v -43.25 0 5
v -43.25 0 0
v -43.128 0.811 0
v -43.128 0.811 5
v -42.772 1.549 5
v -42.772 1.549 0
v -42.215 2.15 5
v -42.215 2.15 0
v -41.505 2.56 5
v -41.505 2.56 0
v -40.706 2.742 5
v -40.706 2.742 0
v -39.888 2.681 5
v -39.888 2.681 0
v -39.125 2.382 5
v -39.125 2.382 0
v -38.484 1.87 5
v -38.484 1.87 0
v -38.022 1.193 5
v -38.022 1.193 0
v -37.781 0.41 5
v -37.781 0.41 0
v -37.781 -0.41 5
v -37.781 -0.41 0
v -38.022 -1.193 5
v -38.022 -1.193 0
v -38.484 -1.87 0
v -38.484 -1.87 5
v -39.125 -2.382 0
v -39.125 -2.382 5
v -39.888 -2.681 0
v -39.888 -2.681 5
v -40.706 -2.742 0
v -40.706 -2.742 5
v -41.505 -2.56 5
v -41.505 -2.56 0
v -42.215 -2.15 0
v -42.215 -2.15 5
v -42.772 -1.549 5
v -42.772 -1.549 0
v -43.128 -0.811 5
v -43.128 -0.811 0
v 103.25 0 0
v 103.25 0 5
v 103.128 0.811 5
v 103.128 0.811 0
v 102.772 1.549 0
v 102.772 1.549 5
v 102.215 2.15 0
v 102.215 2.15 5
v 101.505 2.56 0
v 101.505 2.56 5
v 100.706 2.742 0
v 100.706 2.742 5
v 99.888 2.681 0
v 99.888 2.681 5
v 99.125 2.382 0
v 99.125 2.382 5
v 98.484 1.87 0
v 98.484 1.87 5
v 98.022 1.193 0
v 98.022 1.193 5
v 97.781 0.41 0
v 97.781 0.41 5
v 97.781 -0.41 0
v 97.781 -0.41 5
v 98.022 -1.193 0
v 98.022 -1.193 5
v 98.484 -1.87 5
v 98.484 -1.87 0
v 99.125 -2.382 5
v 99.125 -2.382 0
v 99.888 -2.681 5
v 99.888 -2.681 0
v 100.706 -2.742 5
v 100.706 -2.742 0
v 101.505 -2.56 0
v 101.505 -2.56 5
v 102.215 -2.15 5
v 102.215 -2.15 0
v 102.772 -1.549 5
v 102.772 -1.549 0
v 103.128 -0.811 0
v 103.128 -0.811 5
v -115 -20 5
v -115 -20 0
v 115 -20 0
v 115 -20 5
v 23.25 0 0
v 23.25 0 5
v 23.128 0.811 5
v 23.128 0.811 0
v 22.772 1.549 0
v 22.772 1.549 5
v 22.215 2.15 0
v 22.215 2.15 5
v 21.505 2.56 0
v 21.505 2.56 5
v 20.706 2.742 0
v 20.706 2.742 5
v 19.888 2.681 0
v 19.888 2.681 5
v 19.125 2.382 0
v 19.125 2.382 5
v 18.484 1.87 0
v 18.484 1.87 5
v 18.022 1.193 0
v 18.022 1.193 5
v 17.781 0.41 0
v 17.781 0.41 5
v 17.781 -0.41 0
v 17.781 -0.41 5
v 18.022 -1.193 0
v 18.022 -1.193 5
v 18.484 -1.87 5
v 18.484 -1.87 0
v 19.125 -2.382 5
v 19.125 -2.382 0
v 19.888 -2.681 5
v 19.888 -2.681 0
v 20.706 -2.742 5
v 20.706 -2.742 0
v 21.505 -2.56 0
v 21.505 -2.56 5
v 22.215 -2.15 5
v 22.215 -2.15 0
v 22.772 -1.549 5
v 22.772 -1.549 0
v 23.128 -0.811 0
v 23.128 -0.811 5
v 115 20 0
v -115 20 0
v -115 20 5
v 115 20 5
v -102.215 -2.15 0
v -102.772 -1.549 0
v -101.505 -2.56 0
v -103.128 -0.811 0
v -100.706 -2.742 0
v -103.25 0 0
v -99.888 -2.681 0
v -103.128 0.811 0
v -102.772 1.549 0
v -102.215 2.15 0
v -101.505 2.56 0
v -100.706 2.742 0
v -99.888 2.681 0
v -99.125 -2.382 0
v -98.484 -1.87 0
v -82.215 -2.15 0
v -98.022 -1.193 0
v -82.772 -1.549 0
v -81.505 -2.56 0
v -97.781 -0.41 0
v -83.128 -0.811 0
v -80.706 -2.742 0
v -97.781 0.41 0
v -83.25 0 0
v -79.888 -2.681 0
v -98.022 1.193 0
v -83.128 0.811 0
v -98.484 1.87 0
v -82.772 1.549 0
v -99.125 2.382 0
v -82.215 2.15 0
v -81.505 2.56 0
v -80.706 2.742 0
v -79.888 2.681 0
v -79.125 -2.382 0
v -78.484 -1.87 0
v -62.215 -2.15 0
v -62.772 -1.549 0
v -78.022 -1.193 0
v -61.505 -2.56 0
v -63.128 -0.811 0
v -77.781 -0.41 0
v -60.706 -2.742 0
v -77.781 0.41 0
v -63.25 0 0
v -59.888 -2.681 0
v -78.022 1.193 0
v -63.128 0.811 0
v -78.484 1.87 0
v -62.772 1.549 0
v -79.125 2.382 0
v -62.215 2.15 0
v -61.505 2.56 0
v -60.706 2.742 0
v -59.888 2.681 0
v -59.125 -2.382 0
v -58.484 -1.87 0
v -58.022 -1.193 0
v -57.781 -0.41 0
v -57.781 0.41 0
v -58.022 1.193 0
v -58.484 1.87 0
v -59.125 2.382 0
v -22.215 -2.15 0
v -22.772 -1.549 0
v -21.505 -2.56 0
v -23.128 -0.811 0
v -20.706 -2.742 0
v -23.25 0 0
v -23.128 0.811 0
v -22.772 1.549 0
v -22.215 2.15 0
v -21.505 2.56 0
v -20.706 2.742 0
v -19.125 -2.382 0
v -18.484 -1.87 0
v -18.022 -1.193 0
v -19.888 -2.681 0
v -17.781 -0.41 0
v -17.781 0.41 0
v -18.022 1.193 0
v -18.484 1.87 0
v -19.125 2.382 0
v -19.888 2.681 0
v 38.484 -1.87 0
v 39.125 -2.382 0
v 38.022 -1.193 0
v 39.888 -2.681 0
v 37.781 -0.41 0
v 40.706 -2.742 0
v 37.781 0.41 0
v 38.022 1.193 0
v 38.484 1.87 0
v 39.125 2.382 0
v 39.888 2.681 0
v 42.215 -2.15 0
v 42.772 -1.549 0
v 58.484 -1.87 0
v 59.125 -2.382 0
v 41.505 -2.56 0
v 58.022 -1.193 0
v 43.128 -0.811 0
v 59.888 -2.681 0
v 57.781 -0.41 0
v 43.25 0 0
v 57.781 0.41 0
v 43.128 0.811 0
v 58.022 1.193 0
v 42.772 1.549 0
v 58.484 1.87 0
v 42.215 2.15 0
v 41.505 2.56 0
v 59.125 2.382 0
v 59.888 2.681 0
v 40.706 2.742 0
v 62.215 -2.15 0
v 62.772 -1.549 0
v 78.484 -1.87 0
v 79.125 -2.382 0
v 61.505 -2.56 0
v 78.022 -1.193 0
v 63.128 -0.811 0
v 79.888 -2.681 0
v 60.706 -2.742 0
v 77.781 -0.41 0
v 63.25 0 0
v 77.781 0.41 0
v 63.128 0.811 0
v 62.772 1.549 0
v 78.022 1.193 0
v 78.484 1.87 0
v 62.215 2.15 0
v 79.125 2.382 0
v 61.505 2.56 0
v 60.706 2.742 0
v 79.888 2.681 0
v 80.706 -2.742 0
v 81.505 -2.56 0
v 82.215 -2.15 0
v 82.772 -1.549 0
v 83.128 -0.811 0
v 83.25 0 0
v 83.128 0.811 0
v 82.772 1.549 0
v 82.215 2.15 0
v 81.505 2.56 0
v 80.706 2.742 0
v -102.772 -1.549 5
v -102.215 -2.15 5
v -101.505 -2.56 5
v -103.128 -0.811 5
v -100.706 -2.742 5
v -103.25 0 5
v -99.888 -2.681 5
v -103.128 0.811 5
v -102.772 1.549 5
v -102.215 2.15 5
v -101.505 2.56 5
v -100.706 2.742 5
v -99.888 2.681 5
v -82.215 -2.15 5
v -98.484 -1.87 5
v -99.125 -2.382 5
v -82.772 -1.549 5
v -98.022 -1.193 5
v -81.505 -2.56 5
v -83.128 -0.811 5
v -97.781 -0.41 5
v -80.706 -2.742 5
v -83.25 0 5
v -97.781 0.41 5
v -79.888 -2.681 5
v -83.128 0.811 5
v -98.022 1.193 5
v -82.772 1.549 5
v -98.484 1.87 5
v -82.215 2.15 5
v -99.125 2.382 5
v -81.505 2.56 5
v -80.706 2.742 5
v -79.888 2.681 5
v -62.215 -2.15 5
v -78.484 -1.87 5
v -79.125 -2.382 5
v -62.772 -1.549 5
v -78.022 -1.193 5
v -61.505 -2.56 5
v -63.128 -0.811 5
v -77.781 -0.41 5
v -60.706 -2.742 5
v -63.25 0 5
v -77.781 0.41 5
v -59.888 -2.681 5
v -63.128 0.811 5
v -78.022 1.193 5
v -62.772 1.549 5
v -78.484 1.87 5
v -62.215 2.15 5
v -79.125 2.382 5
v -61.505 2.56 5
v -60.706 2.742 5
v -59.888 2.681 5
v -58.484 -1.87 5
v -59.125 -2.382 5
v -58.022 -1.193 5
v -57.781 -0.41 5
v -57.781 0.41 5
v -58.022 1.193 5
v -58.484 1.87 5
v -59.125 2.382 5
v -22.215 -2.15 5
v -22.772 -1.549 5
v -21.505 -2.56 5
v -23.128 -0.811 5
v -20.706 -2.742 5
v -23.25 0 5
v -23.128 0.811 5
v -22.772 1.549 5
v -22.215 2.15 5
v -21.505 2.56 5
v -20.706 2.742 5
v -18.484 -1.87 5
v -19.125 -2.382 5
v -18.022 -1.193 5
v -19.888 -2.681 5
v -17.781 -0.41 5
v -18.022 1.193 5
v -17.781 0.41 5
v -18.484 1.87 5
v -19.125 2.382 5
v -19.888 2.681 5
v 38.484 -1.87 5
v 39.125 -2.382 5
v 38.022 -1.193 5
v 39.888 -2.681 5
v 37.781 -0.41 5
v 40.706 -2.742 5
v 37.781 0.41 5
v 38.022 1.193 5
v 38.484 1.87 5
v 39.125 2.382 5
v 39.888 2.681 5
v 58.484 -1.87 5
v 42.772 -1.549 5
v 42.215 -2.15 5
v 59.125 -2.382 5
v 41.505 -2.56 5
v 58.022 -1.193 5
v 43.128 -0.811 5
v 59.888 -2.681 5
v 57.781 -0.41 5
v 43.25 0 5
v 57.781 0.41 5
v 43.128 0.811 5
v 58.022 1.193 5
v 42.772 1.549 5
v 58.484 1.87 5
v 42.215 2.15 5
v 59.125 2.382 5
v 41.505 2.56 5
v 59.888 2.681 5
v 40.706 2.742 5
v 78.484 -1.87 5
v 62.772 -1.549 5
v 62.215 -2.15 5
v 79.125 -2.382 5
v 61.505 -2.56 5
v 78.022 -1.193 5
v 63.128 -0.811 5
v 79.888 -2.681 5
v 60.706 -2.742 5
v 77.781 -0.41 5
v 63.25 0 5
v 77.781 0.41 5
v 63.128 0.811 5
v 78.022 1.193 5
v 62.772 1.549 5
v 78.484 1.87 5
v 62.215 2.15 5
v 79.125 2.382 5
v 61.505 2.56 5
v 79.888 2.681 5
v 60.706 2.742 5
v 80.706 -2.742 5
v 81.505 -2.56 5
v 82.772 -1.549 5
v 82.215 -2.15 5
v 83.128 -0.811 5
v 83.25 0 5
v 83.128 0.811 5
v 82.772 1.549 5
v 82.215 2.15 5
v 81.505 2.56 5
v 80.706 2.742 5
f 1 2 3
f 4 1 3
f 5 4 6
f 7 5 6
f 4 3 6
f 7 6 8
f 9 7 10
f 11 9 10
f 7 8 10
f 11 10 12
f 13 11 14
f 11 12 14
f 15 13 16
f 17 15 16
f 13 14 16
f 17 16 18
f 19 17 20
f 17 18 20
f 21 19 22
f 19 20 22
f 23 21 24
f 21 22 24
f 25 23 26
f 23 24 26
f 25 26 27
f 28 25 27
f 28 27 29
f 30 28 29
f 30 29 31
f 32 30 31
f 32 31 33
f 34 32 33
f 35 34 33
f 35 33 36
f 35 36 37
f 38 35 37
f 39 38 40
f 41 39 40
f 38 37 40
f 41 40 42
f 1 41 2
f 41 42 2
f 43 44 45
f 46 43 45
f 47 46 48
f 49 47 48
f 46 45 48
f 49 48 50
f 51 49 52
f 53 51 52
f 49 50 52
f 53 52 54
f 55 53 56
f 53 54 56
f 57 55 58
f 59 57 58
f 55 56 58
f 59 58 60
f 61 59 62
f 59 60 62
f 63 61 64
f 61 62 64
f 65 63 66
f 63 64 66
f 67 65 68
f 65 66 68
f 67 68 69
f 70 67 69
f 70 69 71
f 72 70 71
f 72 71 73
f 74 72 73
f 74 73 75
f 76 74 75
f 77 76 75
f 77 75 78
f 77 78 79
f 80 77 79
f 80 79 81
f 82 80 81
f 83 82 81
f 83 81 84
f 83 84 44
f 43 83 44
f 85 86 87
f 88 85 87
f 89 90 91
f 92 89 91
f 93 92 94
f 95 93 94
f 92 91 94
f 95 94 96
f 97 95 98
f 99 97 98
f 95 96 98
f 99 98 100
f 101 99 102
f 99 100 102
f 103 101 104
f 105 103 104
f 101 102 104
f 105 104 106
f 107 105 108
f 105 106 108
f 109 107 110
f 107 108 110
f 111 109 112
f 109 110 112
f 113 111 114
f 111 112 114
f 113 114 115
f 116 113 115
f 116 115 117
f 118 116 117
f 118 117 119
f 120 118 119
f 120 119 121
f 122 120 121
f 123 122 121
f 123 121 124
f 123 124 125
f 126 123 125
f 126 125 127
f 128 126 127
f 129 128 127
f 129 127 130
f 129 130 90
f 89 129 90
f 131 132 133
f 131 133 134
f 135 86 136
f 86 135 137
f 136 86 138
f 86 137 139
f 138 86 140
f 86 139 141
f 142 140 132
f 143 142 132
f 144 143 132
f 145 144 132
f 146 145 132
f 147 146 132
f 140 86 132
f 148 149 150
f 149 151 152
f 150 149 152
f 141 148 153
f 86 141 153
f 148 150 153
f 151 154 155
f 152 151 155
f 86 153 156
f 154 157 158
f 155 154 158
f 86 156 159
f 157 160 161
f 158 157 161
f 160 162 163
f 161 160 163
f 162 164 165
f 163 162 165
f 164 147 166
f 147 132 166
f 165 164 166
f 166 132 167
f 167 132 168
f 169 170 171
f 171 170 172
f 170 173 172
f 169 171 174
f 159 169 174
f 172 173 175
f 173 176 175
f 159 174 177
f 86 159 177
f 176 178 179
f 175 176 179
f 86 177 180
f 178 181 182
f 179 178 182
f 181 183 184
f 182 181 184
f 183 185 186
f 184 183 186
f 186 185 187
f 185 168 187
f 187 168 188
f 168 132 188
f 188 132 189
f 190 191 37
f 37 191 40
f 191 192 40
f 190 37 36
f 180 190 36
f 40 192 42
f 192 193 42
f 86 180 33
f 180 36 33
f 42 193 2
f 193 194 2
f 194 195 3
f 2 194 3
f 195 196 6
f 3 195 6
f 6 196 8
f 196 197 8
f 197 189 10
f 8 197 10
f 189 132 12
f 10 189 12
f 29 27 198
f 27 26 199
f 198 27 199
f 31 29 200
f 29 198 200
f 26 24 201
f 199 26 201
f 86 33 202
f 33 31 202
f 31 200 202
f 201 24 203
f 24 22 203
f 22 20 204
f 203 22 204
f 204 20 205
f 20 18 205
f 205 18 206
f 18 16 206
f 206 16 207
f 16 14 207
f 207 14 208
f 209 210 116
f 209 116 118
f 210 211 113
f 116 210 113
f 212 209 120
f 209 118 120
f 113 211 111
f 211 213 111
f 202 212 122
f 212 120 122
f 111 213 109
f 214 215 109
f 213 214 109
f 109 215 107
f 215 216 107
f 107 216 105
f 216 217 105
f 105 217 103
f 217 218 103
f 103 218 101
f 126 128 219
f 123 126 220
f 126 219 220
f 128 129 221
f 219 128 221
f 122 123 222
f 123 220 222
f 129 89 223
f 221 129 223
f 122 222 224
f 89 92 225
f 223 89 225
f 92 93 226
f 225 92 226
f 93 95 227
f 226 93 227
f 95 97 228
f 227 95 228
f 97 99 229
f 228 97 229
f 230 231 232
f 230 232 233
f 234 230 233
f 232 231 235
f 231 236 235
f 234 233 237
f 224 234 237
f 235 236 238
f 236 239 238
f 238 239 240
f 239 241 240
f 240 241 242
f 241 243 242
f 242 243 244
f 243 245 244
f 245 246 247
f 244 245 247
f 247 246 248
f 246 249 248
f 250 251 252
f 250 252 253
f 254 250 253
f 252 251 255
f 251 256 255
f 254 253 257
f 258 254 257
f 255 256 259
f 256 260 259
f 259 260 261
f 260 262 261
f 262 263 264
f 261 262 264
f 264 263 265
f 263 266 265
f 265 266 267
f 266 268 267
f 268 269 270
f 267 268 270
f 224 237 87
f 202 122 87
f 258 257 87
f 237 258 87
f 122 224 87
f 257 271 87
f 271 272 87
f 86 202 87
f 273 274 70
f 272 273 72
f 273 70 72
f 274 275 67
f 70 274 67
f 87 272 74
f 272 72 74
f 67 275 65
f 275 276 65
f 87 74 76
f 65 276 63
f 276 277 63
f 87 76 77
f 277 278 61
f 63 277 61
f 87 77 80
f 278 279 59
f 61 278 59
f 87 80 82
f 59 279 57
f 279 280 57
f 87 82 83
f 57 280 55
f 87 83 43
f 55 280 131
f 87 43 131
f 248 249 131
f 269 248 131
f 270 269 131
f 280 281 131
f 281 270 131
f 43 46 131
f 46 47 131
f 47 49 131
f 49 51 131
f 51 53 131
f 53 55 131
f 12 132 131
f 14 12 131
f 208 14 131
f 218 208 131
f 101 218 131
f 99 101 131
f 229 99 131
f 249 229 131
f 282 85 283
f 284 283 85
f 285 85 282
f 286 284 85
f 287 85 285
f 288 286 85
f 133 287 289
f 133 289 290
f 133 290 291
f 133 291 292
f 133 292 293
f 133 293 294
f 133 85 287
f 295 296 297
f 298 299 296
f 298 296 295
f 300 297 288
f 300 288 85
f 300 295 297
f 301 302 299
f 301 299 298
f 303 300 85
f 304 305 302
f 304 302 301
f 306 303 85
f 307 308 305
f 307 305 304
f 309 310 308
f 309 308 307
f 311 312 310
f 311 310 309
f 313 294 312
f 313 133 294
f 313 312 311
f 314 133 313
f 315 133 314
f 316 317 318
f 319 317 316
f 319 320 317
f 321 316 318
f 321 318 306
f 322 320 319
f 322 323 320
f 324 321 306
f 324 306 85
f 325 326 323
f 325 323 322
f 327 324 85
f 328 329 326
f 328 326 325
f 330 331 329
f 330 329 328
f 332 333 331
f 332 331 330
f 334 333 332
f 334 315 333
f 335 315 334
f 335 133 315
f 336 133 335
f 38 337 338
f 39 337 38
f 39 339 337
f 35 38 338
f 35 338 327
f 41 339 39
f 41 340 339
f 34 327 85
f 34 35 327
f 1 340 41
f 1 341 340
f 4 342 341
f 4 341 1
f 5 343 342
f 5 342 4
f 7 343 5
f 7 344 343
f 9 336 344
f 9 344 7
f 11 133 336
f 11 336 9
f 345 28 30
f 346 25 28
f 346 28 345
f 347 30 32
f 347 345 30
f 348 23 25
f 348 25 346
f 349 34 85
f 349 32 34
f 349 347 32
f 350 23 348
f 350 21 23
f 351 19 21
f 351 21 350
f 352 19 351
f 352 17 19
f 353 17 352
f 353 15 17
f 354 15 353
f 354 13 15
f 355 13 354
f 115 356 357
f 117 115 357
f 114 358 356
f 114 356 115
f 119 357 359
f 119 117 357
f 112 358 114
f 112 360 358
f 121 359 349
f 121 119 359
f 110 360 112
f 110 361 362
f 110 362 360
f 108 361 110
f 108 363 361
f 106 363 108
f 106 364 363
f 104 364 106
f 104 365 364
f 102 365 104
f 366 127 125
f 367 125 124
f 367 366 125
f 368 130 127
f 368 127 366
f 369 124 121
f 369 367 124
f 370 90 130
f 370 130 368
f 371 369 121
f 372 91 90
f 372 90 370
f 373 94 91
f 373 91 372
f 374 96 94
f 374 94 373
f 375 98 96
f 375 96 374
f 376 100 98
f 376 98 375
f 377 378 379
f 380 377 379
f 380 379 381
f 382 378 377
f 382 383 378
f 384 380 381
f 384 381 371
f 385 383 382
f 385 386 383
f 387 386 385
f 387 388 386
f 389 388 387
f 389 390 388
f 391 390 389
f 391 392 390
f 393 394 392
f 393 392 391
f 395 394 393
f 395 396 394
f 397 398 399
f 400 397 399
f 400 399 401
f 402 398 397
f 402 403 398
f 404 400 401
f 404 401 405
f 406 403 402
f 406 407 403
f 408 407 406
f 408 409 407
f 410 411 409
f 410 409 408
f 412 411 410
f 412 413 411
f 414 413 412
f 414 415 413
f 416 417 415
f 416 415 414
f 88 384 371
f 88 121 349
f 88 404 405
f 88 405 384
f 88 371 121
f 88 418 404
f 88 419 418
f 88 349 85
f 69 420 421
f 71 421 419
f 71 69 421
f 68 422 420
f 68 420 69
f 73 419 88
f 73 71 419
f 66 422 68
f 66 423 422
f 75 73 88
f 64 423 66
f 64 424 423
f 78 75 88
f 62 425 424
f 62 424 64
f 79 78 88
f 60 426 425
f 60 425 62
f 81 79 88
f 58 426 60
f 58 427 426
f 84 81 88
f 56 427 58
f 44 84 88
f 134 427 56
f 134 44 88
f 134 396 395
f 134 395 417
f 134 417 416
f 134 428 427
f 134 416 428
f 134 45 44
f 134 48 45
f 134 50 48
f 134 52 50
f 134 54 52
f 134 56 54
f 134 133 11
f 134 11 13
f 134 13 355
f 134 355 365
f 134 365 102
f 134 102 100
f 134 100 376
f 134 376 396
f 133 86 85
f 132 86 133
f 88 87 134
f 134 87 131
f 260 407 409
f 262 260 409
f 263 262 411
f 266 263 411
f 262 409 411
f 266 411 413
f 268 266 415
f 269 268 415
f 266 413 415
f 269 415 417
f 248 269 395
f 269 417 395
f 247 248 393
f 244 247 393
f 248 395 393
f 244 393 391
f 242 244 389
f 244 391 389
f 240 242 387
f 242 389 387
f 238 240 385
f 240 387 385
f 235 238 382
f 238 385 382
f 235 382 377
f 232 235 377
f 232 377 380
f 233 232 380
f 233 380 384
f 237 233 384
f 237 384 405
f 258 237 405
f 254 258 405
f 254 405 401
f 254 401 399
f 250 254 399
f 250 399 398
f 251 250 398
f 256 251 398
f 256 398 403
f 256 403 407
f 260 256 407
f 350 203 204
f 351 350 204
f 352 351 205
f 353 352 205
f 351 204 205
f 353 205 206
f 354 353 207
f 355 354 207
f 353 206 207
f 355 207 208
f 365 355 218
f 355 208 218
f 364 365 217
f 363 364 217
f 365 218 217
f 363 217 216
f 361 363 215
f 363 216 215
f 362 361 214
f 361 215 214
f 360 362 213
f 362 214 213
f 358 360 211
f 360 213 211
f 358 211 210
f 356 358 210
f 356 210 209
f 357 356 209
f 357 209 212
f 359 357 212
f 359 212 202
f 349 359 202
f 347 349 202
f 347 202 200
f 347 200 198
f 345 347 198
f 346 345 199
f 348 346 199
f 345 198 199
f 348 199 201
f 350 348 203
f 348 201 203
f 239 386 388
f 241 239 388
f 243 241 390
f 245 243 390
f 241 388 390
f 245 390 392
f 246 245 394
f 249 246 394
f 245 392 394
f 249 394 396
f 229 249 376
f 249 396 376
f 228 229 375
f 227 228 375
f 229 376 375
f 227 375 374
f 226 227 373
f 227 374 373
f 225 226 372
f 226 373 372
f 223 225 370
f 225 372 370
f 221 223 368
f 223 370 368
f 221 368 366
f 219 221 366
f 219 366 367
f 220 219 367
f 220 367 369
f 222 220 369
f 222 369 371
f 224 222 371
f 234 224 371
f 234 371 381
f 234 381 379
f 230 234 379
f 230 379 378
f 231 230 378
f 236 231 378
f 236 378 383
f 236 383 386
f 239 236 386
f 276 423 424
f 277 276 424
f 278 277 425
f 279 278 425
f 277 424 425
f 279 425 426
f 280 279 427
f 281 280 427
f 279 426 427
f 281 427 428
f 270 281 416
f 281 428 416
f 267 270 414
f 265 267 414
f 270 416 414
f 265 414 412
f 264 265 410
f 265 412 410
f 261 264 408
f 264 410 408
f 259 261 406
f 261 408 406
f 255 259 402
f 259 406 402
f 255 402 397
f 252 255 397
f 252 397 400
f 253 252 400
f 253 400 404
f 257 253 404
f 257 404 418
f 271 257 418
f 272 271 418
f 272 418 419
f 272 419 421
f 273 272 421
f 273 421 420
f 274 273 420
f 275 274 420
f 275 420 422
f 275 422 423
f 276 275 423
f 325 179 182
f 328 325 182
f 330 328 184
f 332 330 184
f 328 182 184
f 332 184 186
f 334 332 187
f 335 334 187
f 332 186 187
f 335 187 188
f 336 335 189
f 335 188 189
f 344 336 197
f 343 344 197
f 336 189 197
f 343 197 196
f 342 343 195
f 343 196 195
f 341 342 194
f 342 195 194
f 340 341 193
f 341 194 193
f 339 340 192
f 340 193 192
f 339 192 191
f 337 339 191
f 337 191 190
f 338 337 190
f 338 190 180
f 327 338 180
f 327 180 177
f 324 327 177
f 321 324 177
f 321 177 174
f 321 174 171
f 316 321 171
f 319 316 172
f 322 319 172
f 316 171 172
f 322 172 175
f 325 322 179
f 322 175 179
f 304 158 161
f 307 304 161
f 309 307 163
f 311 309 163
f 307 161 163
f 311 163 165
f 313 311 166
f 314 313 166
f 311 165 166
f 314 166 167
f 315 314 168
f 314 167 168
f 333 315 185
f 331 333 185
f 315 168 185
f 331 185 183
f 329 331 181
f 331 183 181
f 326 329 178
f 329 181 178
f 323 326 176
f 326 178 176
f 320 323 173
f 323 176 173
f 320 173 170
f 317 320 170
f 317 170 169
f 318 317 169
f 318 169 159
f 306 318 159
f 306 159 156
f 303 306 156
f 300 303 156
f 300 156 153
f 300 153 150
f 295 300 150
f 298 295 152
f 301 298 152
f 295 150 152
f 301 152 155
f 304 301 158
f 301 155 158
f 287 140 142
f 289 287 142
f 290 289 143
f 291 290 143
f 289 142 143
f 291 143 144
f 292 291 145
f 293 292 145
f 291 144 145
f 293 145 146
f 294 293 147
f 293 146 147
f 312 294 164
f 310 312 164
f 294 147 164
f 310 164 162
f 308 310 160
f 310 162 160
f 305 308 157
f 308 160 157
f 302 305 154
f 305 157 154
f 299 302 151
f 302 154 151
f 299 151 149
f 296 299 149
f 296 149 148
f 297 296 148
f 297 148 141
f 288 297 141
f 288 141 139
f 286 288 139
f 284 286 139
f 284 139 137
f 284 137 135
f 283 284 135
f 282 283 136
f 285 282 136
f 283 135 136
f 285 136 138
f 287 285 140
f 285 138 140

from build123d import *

# Parameters (mm, degrees)
ESQUISSE1_W                = 230
ESQUISSE1_H                = 40
BOSS_EXTRU_1_DEPTH         = 5
ESQUISSE2_R                = 2.75
ENL_V_MAT_EXTRU_1_DEPTH    = 117.833214455
ESQUISSE8_R                = 2.75
ENL_V_MAT_EXTRU_2_DEPTH    = 5
R_P_TITION_LIN_AIRE2_COUNT = 5
R_P_TITION_LIN_AIRE2_PITCH = 20
R_P_TITION_LIN_AIRE3_COUNT = 5
R_P_TITION_LIN_AIRE3_PITCH = 20


with BuildPart() as part:
    # Esquisse1 → Boss.-Extru.1 (new body)
    with BuildSketch(Plane.XY):
        Rectangle(ESQUISSE1_W, ESQUISSE1_H)
    extrude(amount=BOSS_EXTRU_1_DEPTH)

    # Esquisse2 → Enlèv. mat.-Extru.1 (cut, through all)
    with BuildSketch(Plane.XY.offset(5)):
        with Locations((20.5, 0)):
            Circle(ESQUISSE2_R)
    enl_v_mat_extru_1 = extrude(amount=-ENL_V_MAT_EXTRU_1_DEPTH, mode=Mode.SUBTRACT)

    # Esquisse8 → Enlèv. mat.-Extru.2 (cut)
    with BuildSketch(Plane(origin=(0, 0, 0), x_dir=(-1, 0, 0), z_dir=(0, 0, -1))):
        with Locations((20.5, 0)):
            Circle(ESQUISSE8_R)
    enl_v_mat_extru_2 = extrude(amount=-ENL_V_MAT_EXTRU_2_DEPTH, mode=Mode.SUBTRACT)

    # Répétition linéaire2: Enlèv. mat.-Extru.1 ×5
    with Locations(*[(i * R_P_TITION_LIN_AIRE2_PITCH, 0, 0) for i in range(1, R_P_TITION_LIN_AIRE2_COUNT)]):
        add(enl_v_mat_extru_1, mode=Mode.SUBTRACT)

    # Répétition linéaire3: Enlèv. mat.-Extru.2 ×5
    with Locations(*[(-i * R_P_TITION_LIN_AIRE3_PITCH, 0, 0) for i in range(1, R_P_TITION_LIN_AIRE3_COUNT)]):
        add(enl_v_mat_extru_2, mode=Mode.SUBTRACT)


solid = part.part
